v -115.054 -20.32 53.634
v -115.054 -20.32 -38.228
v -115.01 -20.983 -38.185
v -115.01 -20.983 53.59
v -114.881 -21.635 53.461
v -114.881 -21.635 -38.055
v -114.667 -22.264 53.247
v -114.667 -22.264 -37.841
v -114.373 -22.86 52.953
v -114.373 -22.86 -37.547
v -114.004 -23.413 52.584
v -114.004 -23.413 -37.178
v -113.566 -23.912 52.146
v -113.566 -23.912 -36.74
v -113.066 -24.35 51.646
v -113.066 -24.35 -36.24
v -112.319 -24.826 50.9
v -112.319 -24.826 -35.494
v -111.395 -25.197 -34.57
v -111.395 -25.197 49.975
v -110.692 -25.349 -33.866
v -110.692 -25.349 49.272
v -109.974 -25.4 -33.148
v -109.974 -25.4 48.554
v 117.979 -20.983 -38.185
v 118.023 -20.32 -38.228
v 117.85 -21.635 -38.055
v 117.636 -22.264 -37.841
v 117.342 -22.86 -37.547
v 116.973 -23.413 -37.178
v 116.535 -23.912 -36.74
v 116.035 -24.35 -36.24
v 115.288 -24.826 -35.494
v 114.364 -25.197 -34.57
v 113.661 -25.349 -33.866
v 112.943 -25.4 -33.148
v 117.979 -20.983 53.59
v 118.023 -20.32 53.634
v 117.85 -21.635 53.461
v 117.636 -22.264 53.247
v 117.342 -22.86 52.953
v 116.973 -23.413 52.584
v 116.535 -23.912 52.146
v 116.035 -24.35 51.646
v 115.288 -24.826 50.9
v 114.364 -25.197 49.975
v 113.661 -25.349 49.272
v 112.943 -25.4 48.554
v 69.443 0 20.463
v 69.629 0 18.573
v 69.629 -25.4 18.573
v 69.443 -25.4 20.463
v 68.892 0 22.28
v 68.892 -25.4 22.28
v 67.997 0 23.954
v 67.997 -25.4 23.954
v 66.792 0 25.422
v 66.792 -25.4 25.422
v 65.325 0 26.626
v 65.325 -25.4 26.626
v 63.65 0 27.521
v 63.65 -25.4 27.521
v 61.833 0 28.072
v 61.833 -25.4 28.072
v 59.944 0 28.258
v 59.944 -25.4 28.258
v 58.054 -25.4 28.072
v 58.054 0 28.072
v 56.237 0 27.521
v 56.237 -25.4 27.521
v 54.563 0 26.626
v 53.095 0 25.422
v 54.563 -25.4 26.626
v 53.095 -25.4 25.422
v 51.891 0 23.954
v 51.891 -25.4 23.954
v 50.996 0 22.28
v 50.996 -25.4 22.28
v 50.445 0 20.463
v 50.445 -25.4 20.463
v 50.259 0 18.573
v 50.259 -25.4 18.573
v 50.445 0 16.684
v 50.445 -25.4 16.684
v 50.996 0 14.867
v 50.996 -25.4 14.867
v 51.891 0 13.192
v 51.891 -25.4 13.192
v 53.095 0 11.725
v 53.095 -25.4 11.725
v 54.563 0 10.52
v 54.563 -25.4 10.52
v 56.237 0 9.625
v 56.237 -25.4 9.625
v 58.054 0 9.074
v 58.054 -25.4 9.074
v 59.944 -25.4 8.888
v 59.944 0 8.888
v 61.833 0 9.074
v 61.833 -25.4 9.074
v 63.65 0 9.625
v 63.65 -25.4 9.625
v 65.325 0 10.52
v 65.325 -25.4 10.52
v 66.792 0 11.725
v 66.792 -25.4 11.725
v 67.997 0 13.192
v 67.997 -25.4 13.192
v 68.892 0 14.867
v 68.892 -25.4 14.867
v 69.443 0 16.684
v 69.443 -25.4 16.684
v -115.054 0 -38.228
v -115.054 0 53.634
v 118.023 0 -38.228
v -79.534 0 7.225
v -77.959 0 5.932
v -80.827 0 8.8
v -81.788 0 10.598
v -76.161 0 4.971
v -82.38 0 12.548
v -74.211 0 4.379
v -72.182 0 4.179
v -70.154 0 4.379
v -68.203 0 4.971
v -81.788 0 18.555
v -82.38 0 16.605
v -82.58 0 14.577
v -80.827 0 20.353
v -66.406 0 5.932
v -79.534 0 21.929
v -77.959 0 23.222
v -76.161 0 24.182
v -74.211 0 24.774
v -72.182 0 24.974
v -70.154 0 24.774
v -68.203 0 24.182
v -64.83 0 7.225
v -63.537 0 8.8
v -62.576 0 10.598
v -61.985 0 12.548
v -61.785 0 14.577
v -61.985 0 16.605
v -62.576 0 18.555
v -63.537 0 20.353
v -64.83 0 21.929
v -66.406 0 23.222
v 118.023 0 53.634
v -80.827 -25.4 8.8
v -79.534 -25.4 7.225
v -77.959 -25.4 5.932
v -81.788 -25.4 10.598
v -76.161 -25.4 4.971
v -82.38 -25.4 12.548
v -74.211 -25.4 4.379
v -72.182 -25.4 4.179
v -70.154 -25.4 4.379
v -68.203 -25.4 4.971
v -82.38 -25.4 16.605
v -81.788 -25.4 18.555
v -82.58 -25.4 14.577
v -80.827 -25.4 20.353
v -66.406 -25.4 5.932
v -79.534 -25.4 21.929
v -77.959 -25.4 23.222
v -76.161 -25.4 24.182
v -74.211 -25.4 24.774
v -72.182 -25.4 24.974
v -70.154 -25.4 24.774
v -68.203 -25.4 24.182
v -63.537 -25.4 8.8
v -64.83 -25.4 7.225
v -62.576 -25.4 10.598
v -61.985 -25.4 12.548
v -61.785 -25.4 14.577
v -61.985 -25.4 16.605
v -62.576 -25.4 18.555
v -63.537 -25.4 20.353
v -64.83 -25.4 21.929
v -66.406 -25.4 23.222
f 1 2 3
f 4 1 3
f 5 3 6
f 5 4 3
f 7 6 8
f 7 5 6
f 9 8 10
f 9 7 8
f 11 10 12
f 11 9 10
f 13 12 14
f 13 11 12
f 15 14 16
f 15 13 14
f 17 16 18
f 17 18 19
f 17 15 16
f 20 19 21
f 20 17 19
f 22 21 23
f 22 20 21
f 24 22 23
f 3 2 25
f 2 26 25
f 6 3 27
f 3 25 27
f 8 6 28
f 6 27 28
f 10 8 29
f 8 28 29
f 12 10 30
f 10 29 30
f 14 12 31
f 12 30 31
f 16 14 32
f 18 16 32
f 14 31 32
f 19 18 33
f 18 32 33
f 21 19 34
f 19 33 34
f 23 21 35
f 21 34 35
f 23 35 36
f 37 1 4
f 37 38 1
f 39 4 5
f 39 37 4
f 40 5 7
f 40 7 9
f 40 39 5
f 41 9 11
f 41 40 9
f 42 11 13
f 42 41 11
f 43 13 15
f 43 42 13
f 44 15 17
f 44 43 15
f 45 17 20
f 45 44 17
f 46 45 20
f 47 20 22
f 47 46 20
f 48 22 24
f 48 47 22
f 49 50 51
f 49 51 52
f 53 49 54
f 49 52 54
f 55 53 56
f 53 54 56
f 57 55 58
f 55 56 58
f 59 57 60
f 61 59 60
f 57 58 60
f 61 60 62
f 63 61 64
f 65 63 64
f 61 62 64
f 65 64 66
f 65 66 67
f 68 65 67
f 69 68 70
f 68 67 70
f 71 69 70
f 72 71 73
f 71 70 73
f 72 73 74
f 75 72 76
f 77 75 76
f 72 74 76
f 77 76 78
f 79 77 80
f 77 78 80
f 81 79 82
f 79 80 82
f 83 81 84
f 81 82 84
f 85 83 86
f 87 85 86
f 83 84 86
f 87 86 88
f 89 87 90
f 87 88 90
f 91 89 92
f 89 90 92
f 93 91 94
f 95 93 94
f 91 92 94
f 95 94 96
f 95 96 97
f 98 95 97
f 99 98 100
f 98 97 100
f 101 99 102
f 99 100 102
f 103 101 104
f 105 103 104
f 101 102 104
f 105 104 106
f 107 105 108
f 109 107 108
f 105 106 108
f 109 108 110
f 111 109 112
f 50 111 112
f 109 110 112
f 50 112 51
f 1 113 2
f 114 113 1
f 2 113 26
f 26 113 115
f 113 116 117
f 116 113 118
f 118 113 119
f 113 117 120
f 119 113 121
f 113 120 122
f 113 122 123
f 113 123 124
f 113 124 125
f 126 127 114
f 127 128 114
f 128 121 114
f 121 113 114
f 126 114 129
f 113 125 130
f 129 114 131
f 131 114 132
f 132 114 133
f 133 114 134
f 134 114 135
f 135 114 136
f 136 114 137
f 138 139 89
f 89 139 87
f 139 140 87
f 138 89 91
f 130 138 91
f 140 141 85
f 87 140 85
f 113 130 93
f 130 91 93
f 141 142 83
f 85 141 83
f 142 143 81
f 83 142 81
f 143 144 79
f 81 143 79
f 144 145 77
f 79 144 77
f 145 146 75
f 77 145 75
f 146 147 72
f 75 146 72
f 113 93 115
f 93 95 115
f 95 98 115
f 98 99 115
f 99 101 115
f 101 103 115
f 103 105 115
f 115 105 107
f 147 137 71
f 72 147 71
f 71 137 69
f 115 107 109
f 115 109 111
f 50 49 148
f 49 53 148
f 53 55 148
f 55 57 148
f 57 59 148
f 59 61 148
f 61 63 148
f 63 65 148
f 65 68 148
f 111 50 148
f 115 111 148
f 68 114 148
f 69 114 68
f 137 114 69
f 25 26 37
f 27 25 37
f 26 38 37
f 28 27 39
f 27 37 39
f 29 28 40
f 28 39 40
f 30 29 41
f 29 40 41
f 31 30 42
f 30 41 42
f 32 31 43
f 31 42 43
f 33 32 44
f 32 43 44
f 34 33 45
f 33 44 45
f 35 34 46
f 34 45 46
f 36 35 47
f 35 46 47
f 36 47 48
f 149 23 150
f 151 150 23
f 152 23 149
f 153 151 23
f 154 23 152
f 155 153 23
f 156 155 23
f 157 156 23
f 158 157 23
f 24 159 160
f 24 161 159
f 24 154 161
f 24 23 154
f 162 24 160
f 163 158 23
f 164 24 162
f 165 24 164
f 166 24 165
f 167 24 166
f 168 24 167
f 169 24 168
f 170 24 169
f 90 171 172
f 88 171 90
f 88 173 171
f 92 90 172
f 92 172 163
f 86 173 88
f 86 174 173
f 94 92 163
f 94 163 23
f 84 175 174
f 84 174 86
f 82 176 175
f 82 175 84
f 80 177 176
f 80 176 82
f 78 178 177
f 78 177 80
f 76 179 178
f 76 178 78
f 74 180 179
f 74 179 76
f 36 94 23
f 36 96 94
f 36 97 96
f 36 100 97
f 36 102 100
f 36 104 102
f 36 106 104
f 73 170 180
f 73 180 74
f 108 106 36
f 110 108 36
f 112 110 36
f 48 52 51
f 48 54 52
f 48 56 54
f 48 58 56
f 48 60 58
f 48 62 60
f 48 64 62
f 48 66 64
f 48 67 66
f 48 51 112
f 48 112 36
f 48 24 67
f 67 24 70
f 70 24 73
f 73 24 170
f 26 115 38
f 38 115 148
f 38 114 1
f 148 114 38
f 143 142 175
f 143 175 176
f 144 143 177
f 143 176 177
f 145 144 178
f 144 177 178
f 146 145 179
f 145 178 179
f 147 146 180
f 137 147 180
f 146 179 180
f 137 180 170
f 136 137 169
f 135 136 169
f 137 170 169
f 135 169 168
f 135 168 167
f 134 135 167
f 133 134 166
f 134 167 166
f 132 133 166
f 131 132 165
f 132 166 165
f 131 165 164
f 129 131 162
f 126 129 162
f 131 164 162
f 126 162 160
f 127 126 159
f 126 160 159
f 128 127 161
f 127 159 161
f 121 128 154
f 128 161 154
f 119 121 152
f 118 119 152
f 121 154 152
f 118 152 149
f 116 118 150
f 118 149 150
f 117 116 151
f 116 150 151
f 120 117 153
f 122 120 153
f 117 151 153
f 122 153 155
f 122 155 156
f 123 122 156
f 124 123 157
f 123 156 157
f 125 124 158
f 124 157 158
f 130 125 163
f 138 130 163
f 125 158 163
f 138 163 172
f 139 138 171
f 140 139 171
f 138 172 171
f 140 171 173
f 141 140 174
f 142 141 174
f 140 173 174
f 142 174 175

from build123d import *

# Parameters (mm, degrees)
F0_W     = 233.076439
F0_H     = 91.861807
F1_DEPTH = 25.4
F2_R     = 5.08
F3_R     = 10.397346
F3_R_2   = 9.68524
F4_DEPTH = 25.4


with BuildPart() as f1:
    # F0 (on Front) → F1 (new body)
    with BuildSketch(Plane.XZ):
        with Locations((1.484566, 7.702914)):
            Rectangle(F0_W, F0_H)
    extrude(amount=F1_DEPTH)

    # F2
    f2_edges = [f1.edges().sort_by_distance(p)[0] for p in [
        (1.484565, -25.4, 53.633817),
        (-115.053654, -25.4, 7.702913),
        (1.484565, -25.4, -38.22799),
        (118.022785, -25.4, 7.702913),
    ]]
    fillet(f2_edges, radius=F2_R)

    # F3 (on face) → F4 (cut)
    with BuildSketch(Plane.XZ.offset(25.4)):
        with Locations((-72.182253, 14.576591)):
            Circle(F3_R)
        with Locations((59.943877, 18.573165)):
            Circle(F3_R_2)
    extrude(amount=-F4_DEPTH, mode=Mode.SUBTRACT)


solid = f1.part
